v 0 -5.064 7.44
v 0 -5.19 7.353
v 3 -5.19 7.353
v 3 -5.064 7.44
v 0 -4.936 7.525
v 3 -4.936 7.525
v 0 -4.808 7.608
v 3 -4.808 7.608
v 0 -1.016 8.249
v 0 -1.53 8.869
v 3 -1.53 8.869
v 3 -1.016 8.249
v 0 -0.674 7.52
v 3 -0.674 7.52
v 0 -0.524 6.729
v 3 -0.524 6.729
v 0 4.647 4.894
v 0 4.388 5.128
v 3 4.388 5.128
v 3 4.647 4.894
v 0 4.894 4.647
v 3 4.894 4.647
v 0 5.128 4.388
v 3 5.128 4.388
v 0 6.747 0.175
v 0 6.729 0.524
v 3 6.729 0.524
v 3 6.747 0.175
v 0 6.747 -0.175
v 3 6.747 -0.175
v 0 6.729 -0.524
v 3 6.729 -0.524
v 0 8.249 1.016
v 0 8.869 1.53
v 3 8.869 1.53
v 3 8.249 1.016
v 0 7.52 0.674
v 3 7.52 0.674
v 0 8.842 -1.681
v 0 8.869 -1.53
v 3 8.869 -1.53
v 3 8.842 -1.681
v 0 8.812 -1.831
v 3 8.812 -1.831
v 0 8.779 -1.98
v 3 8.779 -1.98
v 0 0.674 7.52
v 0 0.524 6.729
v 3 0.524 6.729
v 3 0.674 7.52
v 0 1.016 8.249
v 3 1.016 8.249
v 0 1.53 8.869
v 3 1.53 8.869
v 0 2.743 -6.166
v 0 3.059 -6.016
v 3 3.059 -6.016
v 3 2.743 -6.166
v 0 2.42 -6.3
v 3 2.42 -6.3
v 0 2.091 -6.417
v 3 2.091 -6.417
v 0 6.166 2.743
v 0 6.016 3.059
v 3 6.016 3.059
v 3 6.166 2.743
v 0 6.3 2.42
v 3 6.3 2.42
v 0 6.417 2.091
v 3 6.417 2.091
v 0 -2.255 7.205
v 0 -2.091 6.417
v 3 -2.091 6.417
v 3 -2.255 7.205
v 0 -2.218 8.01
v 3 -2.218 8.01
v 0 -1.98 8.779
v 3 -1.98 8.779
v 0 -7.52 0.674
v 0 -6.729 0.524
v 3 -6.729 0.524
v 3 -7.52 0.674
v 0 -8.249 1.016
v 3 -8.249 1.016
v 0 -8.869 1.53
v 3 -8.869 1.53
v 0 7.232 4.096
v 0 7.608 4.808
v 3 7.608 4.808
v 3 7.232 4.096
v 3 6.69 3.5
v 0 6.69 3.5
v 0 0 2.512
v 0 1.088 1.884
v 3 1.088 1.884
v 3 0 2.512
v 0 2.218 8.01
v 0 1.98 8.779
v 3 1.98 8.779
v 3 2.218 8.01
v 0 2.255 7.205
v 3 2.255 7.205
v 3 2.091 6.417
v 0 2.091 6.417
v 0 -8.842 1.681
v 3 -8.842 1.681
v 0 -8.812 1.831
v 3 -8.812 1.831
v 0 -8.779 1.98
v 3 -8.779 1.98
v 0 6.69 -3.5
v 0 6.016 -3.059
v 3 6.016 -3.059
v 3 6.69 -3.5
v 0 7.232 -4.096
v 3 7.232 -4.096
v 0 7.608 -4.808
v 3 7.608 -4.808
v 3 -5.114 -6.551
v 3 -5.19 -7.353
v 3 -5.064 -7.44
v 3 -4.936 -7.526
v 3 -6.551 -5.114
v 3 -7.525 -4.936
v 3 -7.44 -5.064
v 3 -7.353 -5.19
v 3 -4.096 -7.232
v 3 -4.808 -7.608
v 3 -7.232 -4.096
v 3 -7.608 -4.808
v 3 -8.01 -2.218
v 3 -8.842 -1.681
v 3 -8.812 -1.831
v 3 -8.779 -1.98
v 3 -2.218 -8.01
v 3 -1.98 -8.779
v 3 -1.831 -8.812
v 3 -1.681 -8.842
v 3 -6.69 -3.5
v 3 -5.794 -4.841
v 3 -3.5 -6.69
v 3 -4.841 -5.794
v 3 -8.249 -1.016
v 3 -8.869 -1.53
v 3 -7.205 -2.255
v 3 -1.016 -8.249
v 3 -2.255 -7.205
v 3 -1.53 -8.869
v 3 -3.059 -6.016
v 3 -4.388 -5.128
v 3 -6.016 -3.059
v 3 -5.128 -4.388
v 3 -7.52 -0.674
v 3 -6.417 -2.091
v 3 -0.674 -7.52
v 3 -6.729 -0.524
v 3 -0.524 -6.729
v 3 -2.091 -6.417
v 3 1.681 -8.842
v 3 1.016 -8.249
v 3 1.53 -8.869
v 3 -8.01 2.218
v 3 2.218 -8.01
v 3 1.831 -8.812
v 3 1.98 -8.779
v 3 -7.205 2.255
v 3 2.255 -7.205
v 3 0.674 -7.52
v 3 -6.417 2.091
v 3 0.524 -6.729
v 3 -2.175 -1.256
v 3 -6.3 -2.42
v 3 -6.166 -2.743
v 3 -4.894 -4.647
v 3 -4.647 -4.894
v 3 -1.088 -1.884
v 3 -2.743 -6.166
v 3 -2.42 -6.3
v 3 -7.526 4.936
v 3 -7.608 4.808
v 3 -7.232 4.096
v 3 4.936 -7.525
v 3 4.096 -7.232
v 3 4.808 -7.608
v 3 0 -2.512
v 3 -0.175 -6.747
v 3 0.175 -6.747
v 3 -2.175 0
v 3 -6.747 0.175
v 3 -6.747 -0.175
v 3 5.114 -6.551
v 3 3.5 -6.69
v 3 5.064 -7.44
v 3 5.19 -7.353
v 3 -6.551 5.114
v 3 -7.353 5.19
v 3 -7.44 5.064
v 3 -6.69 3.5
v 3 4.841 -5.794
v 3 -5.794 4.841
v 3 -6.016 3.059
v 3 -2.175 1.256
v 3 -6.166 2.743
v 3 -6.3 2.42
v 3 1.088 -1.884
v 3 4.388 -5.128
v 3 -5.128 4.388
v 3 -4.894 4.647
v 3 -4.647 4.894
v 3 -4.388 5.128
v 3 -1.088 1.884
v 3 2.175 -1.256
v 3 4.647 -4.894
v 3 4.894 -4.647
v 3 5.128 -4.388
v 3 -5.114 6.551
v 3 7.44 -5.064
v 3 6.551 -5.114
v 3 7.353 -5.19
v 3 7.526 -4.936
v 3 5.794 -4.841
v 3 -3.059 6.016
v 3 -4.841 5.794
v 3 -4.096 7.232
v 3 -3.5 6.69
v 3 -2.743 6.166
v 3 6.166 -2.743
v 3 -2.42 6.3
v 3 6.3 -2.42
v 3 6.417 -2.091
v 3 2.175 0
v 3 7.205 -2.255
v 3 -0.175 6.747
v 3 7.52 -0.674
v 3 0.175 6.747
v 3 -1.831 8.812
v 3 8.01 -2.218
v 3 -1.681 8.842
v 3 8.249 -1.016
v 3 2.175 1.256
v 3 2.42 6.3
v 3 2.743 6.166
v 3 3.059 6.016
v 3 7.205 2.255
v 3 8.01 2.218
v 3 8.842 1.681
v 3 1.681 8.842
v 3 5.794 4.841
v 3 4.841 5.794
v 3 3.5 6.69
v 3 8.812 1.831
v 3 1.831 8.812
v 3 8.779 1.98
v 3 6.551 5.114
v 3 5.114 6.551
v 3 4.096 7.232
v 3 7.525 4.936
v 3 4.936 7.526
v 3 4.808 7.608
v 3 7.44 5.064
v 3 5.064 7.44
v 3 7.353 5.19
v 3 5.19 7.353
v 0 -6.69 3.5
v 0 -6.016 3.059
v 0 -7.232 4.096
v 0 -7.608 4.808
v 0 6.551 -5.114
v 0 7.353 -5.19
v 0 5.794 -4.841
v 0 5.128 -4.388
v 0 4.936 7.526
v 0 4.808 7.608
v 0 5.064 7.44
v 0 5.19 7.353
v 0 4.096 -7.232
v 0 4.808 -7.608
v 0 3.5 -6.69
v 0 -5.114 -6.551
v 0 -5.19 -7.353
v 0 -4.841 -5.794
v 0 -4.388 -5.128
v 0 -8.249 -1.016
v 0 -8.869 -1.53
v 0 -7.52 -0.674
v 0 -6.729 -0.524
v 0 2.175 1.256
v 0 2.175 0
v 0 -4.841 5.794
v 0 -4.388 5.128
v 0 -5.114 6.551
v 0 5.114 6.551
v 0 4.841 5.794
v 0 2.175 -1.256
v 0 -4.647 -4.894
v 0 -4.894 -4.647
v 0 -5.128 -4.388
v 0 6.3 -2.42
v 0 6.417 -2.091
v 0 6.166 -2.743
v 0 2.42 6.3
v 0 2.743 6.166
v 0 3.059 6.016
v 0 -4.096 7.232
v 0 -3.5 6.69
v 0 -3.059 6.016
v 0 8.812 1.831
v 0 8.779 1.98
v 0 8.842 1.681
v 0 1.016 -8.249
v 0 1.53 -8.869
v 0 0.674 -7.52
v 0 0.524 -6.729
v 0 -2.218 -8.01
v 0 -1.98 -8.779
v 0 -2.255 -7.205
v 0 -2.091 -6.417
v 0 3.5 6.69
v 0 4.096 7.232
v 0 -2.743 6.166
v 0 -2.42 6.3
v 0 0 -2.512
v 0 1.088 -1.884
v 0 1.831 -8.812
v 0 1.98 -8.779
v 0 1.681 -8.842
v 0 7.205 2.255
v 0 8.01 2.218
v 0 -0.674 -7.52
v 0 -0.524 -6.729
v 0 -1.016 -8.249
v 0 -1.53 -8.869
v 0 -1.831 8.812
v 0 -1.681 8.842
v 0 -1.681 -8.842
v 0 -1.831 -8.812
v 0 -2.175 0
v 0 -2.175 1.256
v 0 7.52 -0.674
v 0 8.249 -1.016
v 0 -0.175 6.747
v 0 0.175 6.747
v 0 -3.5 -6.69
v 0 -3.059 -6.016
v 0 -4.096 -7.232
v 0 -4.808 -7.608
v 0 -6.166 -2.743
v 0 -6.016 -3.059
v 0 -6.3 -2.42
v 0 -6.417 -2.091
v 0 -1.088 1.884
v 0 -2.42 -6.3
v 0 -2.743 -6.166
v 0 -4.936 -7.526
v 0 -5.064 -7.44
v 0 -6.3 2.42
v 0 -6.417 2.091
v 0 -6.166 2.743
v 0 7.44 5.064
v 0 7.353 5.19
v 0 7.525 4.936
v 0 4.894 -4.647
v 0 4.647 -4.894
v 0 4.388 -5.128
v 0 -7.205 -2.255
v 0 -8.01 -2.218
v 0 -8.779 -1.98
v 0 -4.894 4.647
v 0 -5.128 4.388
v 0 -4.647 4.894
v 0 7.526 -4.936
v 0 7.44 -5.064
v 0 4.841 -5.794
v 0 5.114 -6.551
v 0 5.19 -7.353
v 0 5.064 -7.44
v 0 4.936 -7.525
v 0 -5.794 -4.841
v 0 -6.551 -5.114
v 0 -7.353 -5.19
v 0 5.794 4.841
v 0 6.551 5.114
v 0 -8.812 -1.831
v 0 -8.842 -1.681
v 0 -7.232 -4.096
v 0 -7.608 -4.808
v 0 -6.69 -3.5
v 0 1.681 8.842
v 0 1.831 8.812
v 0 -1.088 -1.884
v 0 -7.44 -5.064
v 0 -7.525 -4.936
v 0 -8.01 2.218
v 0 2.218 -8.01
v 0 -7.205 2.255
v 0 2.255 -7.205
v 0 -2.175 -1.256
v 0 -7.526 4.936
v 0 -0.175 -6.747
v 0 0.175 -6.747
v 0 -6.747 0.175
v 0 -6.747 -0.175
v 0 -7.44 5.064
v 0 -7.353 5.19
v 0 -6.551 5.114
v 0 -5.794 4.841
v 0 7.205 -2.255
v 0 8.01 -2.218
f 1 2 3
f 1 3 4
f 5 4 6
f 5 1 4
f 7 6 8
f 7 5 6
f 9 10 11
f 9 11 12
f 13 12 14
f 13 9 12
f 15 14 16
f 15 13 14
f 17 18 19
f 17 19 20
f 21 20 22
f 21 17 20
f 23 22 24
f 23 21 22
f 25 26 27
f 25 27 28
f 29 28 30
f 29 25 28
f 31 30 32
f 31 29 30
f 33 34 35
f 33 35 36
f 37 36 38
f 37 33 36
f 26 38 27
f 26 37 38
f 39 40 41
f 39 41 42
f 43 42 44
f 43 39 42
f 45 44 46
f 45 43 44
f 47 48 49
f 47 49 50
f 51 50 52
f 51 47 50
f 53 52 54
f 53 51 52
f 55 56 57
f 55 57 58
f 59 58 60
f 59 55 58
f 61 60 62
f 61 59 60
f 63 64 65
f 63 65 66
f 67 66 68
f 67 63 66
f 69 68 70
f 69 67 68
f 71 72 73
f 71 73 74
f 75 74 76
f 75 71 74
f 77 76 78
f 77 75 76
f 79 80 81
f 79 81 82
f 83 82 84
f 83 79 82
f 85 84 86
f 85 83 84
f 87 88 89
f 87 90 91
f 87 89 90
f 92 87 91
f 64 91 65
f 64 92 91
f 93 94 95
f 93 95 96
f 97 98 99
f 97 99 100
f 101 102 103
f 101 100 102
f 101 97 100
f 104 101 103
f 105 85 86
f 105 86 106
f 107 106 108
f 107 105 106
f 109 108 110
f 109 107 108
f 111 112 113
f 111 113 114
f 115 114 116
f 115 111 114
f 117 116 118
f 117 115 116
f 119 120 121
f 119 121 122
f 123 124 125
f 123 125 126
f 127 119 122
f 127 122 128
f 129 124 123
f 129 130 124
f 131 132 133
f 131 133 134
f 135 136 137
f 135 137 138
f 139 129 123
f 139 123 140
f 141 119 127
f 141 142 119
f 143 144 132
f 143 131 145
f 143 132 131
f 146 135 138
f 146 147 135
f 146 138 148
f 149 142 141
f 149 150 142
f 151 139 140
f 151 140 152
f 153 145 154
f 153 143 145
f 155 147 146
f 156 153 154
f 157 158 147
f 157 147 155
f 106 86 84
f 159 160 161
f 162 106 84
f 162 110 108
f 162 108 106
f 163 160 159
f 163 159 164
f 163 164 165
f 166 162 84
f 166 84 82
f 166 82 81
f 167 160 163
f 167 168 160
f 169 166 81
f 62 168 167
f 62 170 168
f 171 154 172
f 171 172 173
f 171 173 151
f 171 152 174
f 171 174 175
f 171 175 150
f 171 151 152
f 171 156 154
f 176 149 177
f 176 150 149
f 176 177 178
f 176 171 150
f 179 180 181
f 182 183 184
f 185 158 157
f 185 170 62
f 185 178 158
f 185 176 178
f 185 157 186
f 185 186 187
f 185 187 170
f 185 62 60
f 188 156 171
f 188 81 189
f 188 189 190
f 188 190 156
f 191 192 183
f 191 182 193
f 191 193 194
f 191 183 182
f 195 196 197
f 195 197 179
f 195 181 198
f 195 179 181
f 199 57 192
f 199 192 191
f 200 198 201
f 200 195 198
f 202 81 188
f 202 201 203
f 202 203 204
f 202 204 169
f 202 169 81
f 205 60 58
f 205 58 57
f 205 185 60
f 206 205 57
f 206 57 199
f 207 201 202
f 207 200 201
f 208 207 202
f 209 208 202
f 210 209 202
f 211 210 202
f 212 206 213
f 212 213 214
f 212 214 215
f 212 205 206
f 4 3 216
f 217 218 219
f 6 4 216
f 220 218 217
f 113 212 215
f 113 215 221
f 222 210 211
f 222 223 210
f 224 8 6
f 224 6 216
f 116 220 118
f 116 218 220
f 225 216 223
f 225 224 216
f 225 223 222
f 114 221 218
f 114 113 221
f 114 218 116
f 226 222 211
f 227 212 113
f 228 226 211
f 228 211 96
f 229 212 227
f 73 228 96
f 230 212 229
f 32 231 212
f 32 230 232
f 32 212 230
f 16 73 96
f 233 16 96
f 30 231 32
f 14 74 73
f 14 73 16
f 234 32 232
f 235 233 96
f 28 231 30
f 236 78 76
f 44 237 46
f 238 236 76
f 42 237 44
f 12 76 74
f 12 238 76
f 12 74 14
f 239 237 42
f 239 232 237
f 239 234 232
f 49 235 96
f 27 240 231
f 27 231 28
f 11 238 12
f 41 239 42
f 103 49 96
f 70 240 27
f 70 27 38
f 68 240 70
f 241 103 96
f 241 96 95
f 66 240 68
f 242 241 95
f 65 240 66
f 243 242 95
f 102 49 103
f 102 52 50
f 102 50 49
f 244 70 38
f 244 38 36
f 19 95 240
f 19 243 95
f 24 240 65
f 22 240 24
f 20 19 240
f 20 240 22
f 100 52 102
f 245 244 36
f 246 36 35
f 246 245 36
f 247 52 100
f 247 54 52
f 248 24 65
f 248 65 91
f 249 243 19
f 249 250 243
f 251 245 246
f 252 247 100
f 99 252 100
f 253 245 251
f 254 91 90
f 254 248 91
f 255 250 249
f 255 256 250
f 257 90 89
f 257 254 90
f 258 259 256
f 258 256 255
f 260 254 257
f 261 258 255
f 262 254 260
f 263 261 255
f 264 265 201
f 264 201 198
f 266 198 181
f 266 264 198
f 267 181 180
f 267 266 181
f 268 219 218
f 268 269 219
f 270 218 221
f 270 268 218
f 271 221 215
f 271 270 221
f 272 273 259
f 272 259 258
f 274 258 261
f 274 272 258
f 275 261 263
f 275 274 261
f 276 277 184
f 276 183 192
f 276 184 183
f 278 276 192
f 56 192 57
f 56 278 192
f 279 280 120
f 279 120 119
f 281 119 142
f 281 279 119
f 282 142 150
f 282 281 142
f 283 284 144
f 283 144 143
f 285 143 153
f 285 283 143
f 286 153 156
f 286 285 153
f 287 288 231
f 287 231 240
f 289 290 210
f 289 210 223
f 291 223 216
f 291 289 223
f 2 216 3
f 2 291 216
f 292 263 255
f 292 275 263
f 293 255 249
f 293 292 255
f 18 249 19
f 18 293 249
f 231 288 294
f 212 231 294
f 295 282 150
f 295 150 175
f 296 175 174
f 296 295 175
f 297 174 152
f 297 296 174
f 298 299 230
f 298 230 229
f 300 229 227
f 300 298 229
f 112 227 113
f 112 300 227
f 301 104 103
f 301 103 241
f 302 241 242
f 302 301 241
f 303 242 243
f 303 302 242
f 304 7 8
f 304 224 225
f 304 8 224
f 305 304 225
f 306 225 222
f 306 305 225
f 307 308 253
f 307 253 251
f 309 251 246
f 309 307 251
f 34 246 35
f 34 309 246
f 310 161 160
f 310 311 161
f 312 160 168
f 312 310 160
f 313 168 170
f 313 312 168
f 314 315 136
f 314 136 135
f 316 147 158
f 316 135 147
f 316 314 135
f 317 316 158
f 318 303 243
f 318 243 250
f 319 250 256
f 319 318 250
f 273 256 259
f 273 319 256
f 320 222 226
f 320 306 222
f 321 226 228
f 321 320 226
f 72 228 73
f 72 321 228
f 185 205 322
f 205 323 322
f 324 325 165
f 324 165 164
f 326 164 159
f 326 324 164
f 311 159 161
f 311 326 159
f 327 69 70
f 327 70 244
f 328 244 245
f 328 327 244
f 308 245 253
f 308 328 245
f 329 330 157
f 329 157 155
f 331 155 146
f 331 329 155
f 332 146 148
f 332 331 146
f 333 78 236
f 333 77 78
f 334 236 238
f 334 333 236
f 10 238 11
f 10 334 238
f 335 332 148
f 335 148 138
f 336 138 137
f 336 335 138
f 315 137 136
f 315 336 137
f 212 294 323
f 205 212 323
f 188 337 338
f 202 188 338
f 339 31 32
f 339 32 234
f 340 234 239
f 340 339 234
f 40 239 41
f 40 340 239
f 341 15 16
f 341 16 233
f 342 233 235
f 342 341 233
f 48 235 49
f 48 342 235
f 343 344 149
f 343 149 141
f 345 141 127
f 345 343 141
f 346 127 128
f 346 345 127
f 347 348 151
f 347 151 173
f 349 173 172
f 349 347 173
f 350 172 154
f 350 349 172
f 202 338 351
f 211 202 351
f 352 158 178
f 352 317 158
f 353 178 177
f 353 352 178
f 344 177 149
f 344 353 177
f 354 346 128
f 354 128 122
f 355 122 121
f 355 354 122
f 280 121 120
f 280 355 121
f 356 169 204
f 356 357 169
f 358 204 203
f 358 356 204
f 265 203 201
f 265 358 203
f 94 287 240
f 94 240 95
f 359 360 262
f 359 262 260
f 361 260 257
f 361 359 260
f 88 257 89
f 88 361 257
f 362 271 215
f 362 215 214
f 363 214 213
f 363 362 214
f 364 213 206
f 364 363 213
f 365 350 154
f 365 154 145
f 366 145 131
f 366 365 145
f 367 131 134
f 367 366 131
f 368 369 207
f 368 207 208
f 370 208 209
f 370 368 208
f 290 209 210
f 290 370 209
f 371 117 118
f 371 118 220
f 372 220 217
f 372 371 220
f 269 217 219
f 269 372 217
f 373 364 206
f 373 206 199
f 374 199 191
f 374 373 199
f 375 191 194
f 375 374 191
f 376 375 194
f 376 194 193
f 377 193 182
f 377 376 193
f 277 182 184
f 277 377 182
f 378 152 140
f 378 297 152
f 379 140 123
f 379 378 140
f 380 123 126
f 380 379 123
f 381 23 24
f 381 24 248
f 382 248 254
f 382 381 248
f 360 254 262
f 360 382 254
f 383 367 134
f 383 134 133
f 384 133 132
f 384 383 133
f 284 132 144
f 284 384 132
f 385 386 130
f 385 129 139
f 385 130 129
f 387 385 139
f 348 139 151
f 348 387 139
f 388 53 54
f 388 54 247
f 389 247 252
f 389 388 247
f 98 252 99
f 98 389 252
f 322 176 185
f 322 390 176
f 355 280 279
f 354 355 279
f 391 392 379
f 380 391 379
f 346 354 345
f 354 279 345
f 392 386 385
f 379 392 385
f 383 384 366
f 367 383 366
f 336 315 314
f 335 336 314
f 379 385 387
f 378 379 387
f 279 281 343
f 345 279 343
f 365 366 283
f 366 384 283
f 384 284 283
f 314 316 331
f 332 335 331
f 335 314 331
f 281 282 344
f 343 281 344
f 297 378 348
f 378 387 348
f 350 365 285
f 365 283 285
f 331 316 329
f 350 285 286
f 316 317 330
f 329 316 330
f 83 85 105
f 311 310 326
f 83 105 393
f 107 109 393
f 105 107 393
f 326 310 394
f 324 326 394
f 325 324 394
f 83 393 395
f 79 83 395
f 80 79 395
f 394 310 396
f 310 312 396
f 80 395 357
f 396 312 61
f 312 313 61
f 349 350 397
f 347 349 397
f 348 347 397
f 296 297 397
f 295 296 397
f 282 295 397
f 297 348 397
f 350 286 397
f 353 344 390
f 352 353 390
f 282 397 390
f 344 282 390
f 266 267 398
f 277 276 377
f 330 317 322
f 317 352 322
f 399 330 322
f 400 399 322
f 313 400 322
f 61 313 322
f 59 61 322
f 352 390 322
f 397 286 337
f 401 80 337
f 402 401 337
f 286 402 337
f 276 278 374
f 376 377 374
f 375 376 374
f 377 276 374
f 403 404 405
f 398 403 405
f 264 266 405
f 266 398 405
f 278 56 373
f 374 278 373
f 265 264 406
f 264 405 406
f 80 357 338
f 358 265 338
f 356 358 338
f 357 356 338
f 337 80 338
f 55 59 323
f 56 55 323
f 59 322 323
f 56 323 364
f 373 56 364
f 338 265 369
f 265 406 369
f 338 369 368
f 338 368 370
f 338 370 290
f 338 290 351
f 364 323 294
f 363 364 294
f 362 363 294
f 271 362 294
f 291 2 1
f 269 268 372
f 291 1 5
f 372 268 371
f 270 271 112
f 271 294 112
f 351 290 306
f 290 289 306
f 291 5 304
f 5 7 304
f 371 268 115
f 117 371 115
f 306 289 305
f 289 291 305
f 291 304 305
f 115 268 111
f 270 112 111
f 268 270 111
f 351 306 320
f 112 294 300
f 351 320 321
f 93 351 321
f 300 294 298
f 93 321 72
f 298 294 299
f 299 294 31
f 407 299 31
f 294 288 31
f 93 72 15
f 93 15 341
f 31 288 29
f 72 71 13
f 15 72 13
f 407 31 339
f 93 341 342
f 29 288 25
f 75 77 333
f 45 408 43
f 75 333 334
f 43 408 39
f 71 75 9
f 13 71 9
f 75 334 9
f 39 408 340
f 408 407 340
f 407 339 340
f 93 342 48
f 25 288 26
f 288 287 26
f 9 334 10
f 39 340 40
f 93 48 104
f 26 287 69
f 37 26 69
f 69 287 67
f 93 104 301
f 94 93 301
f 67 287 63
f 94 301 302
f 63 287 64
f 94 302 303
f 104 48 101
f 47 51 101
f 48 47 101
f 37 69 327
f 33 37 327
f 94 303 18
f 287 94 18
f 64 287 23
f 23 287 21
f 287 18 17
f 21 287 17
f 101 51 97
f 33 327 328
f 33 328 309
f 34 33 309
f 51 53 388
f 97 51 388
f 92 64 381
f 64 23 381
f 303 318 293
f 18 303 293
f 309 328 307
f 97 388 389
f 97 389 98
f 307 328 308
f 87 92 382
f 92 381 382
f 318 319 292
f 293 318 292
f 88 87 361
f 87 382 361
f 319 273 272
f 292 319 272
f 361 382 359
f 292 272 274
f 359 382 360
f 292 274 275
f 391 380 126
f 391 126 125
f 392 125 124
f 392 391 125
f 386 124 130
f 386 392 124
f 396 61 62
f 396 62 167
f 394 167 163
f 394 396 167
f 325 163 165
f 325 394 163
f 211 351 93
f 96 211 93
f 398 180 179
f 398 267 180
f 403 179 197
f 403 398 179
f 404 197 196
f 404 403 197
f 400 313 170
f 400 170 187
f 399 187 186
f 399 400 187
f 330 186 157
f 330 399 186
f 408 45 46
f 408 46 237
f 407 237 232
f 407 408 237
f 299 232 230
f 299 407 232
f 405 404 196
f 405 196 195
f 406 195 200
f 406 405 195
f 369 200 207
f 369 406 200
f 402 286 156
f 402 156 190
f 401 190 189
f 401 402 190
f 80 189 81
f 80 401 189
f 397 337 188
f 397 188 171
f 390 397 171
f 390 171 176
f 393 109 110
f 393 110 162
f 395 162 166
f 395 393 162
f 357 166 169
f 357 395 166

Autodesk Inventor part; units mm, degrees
ref_plane "YZ Plane" through (0, 0, 0) normal (1, 0, 0) x (0, 1, 0)
ref_plane "XZ Plane" through (0, 0, 0) normal (0, 1, 0) x (-1, 0, 0)
ref_plane "XY Plane" through (0, 0, 0) normal (0, 0, 1) x (1, 0, 0)
sketch "Sketch1" plane through (0, 0, 0) normal (1, 0, 0) x (0, 1, 0)
  arc A0 (-4.3875, 5.1282) -> (-5.1282, 4.3875) centre (0, 0) ccw
  arc A1 (-5.1895, 7.3532) -> (-4.3875, 5.1282) centre (-1.9912, 7.249) ccw
  arc A2 (-3.0589, 6.016) -> (-4.8075, 7.6084) centre (-5.9352, 4.6137) ccw
  arc A3 (-4.8075, 7.6084) -> (-5.1895, 7.3532) centre (0, 0) ccw
  arc A4 (-2.091, 6.4169) -> (-3.0589, 6.016) centre (0, 0) ccw
  arc A5 (-1.9805, 8.7794) -> (-2.091, 6.4169) centre (0.9345, 7.4592) ccw
  arc A6 (-1.5299, 8.869) -> (-1.9805, 8.7794) centre (0, 0) ccw
  arc A7 (-0.5238, 6.7286) -> (-1.5299, 8.869) centre (-3.7179, 6.5338) ccw
  arc A8 (0.5238, 6.7286) -> (-0.5238, 6.7286) centre (0, 0) ccw
  arc A9 (1.5299, 8.869) -> (0.5238, 6.7286) centre (3.7179, 6.5338) ccw
  arc A10 (1.9805, 8.7794) -> (1.5299, 8.869) centre (0, 0) ccw
  arc A11 (2.091, 6.4169) -> (1.9805, 8.7794) centre (-0.9345, 7.4592) ccw
  arc A12 (3.0589, 6.016) -> (2.091, 6.4169) centre (0, 0) ccw
  arc A13 (4.8075, 7.6084) -> (3.0589, 6.016) centre (5.9352, 4.6137) ccw
  arc A14 (5.1895, 7.3532) -> (4.8075, 7.6084) centre (0, 0) ccw
  arc A15 (4.3875, 5.1282) -> (5.1895, 7.3532) centre (1.9912, 7.249) ccw
  arc A16 (5.1282, 4.3875) -> (4.3875, 5.1282) centre (0, 0) ccw
  arc A17 (7.3532, 5.1895) -> (5.1282, 4.3875) centre (7.249, 1.9912) ccw
  arc A18 (7.6084, 4.8075) -> (7.3532, 5.1895) centre (0, 0) ccw
  arc A19 (6.016, 3.0589) -> (7.6084, 4.8075) centre (4.6137, 5.9352) ccw
  arc A20 (6.4169, 2.091) -> (6.016, 3.0589) centre (0, 0) ccw
  arc A21 (8.7794, 1.9805) -> (6.4169, 2.091) centre (7.4592, -0.9345) ccw
  arc A22 (8.869, 1.5299) -> (8.7794, 1.9805) centre (0, 0) ccw
  arc A23 (6.7286, 0.5238) -> (8.869, 1.5299) centre (6.5338, 3.7179) ccw
  arc A24 (6.7286, -0.5238) -> (6.7286, 0.5238) centre (0, 0) ccw
  arc A25 (8.869, -1.5299) -> (6.7286, -0.5238) centre (6.5338, -3.7179) ccw
  arc A26 (8.7794, -1.9805) -> (8.869, -1.5299) centre (0, 0) ccw
  arc A27 (6.4169, -2.091) -> (8.7794, -1.9805) centre (7.4592, 0.9345) ccw
  arc A28 (6.016, -3.0589) -> (6.4169, -2.091) centre (0, 0) ccw
  arc A29 (7.6084, -4.8075) -> (6.016, -3.0589) centre (4.6137, -5.9352) ccw
  arc A30 (7.3532, -5.1895) -> (7.6084, -4.8075) centre (0, 0) ccw
  arc A31 (5.1282, -4.3875) -> (7.3532, -5.1895) centre (7.249, -1.9912) ccw
  arc A32 (4.3875, -5.1282) -> (5.1282, -4.3875) centre (0, 0) ccw
  arc A33 (5.1895, -7.3532) -> (4.3875, -5.1282) centre (1.9912, -7.249) ccw
  arc A34 (4.8075, -7.6084) -> (5.1895, -7.3532) centre (0, 0) ccw
  arc A35 (3.0589, -6.016) -> (4.8075, -7.6084) centre (5.9352, -4.6137) ccw
  arc A36 (-8.869, 1.5299) -> (-6.7286, 0.5238) centre (-6.5338, 3.7179) ccw
  arc A37 (-6.7286, 0.5238) -> (-6.7286, -0.5238) centre (0, 0) ccw
  arc A38 (-6.7286, -0.5238) -> (-8.869, -1.5299) centre (-6.5338, -3.7179) ccw
  arc A39 (-8.869, -1.5299) -> (-8.7794, -1.9805) centre (0, 0) ccw
  arc A40 (-8.7794, -1.9805) -> (-6.4169, -2.091) centre (-7.4592, 0.9345) ccw
  arc A41 (-6.4169, -2.091) -> (-6.016, -3.0589) centre (0, 0) ccw
  arc A42 (-6.016, -3.0589) -> (-7.6084, -4.8075) centre (-4.6137, -5.9352) ccw
  arc A43 (-7.6084, -4.8075) -> (-7.3532, -5.1895) centre (0, 0) ccw
  arc A44 (-7.3532, -5.1895) -> (-5.1282, -4.3875) centre (-7.249, -1.9912) ccw
  arc A45 (-5.1282, -4.3875) -> (-4.3875, -5.1282) centre (0, 0) ccw
  arc A46 (-4.3875, -5.1282) -> (-5.1895, -7.3532) centre (-1.9912, -7.249) ccw
  arc A47 (-5.1895, -7.3532) -> (-4.8075, -7.6084) centre (0, 0) ccw
  arc A48 (-4.8075, -7.6084) -> (-3.0589, -6.016) centre (-5.9352, -4.6137) ccw
  arc A49 (-3.0589, -6.016) -> (-2.091, -6.4169) centre (0, 0) ccw
  arc A50 (-2.091, -6.4169) -> (-1.9805, -8.7794) centre (0.9345, -7.4592) ccw
  arc A51 (-1.9805, -8.7794) -> (-1.5299, -8.869) centre (0, 0) ccw
  arc A52 (-1.5299, -8.869) -> (-0.5238, -6.7286) centre (-3.7179, -6.5338) ccw
  arc A53 (-0.5238, -6.7286) -> (0.5238, -6.7286) centre (0, 0) ccw
  arc A54 (0.5238, -6.7286) -> (1.5299, -8.869) centre (3.7179, -6.5338) ccw
  arc A55 (1.5299, -8.869) -> (1.9805, -8.7794) centre (0, 0) ccw
  arc A56 (1.9805, -8.7794) -> (2.091, -6.4169) centre (-0.9345, -7.4592) ccw
  arc A57 (2.091, -6.4169) -> (3.0589, -6.016) centre (0, 0) ccw
  arc A58 (3.0589, -6.016) -> (4.8075, -7.6084) centre (5.9352, -4.6137) ccw
  arc A59 (4.8075, -7.6084) -> (5.1895, -7.3532) centre (0, 0) ccw
  arc A60 (5.1895, -7.3532) -> (4.3875, -5.1282) centre (1.9912, -7.249) ccw
  arc A61 (4.3875, -5.1282) -> (5.1282, -4.3875) centre (0, 0) ccw
  arc A62 (5.1282, -4.3875) -> (7.3532, -5.1895) centre (7.249, -1.9912) ccw
  arc A63 (7.3532, -5.1895) -> (7.6084, -4.8075) centre (0, 0) ccw
  arc A64 (7.6084, -4.8075) -> (6.016, -3.0589) centre (4.6137, -5.9352) ccw
  arc A65 (6.016, -3.0589) -> (6.4169, -2.091) centre (0, 0) ccw
  arc A66 (6.4169, -2.091) -> (8.7794, -1.9805) centre (7.4592, 0.9345) ccw
  arc A67 (8.7794, -1.9805) -> (8.869, -1.5299) centre (0, 0) ccw
  arc A68 (8.869, -1.5299) -> (6.7286, -0.5238) centre (6.5338, -3.7179) ccw
  arc A69 (6.7286, -0.5238) -> (6.7286, 0.5238) centre (0, 0) ccw
  arc A70 (6.7286, 0.5238) -> (8.869, 1.5299) centre (6.5338, 3.7179) ccw
  arc A71 (8.869, 1.5299) -> (8.7794, 1.9805) centre (0, 0) ccw
  arc A72 (8.7794, 1.9805) -> (6.4169, 2.091) centre (7.4592, -0.9345) ccw
  arc A73 (6.4169, 2.091) -> (6.016, 3.0589) centre (0, 0) ccw
  arc A74 (6.016, 3.0589) -> (7.6084, 4.8075) centre (4.6137, 5.9352) ccw
  arc A75 (7.6084, 4.8075) -> (7.3532, 5.1895) centre (0, 0) ccw
  arc A76 (7.3532, 5.1895) -> (5.1282, 4.3875) centre (7.249, 1.9912) ccw
  arc A77 (5.1282, 4.3875) -> (4.3875, 5.1282) centre (0, 0) ccw
  arc A78 (4.3875, 5.1282) -> (5.1895, 7.3532) centre (1.9912, 7.249) ccw
  arc A79 (5.1895, 7.3532) -> (4.8075, 7.6084) centre (0, 0) ccw
  arc A80 (4.8075, 7.6084) -> (3.0589, 6.016) centre (5.9352, 4.6137) ccw
  arc A81 (3.0589, 6.016) -> (2.091, 6.4169) centre (0, 0) ccw
  arc A82 (2.091, 6.4169) -> (1.9805, 8.7794) centre (-0.9345, 7.4592) ccw
  arc A83 (1.9805, 8.7794) -> (1.5299, 8.869) centre (0, 0) ccw
  arc A84 (1.5299, 8.869) -> (0.5238, 6.7286) centre (3.7179, 6.5338) ccw
  arc A85 (0.5238, 6.7286) -> (-0.5238, 6.7286) centre (0, 0) ccw
  arc A86 (-0.5238, 6.7286) -> (-1.5299, 8.869) centre (-3.7179, 6.5338) ccw
  arc A87 (-1.5299, 8.869) -> (-1.9805, 8.7794) centre (0, 0) ccw
  arc A88 (-1.9805, 8.7794) -> (-2.091, 6.4169) centre (0.9345, 7.4592) ccw
  arc A89 (-2.091, 6.4169) -> (-3.0589, 6.016) centre (0, 0) ccw
  arc A90 (-3.0589, 6.016) -> (-4.8075, 7.6084) centre (-5.9352, 4.6137) ccw
  arc A91 (-4.8075, 7.6084) -> (-5.1895, 7.3532) centre (0, 0) ccw
  arc A92 (-5.1895, 7.3532) -> (-4.3875, 5.1282) centre (-1.9912, 7.249) ccw
  arc A93 (-4.3875, 5.1282) -> (-5.1282, 4.3875) centre (0, 0) ccw
  arc A94 (-5.1282, 4.3875) -> (-7.3532, 5.1895) centre (-7.249, 1.9912) ccw
  arc A95 (-7.3532, 5.1895) -> (-7.6084, 4.8075) centre (0, 0) ccw
  arc A96 (-7.6084, 4.8075) -> (-6.016, 3.0589) centre (-4.6137, 5.9352) ccw
  arc A97 (-6.016, 3.0589) -> (-6.4169, 2.091) centre (0, 0) ccw
  arc A98 (-6.4169, 2.091) -> (-8.7794, 1.9805) centre (-7.4592, -0.9345) ccw
  arc A99 (-8.7794, 1.9805) -> (-8.869, 1.5299) centre (0, 0) ccw
  circle A100 centre (0, 0) radius 2.175
  line L0 (0, 0) -> (2.175, 0)
  line L1 (2.175, 0) -> (2.175, -1.2557)
  line L2 (2.175, -1.2557) -> (0, -2.5115)
  line L3 (-1.5245, 0) -> (0, 0)
  line L4 (0, 0) -> (0, -2.5115)
  line L5 (-2.175, 0) -> (-2.175, -1.2557)
  line L6 (-2.175, -1.2557) -> (0, -2.5115)
  line L7 (2.175, 0) -> (2.175, 1.2557)
  line L8 (2.175, 1.2557) -> (0, 2.5115)
  line L9 (-2.175, 0) -> (-2.175, 1.2557)
  line L10 (-2.175, 1.2557) -> (0, 2.5115)
  point P0 (0, -0.8741)
  point P1 (3.0589, -6.016)
  point P2 (-5.1282, 4.3875)
  point P3 (1.0875, -1.8836)
  point P4 (2.175, -0.6279)
  dimension "d14" = 120
  dimension "d17" = 4.35
extrude "Extrusion1" add sketch "Sketch1" along normal blind 3
equation "\"d17\" = d_agu"
equation "\"d_agu\" = 4.35"
properties part number "EngraneMod_v2"
